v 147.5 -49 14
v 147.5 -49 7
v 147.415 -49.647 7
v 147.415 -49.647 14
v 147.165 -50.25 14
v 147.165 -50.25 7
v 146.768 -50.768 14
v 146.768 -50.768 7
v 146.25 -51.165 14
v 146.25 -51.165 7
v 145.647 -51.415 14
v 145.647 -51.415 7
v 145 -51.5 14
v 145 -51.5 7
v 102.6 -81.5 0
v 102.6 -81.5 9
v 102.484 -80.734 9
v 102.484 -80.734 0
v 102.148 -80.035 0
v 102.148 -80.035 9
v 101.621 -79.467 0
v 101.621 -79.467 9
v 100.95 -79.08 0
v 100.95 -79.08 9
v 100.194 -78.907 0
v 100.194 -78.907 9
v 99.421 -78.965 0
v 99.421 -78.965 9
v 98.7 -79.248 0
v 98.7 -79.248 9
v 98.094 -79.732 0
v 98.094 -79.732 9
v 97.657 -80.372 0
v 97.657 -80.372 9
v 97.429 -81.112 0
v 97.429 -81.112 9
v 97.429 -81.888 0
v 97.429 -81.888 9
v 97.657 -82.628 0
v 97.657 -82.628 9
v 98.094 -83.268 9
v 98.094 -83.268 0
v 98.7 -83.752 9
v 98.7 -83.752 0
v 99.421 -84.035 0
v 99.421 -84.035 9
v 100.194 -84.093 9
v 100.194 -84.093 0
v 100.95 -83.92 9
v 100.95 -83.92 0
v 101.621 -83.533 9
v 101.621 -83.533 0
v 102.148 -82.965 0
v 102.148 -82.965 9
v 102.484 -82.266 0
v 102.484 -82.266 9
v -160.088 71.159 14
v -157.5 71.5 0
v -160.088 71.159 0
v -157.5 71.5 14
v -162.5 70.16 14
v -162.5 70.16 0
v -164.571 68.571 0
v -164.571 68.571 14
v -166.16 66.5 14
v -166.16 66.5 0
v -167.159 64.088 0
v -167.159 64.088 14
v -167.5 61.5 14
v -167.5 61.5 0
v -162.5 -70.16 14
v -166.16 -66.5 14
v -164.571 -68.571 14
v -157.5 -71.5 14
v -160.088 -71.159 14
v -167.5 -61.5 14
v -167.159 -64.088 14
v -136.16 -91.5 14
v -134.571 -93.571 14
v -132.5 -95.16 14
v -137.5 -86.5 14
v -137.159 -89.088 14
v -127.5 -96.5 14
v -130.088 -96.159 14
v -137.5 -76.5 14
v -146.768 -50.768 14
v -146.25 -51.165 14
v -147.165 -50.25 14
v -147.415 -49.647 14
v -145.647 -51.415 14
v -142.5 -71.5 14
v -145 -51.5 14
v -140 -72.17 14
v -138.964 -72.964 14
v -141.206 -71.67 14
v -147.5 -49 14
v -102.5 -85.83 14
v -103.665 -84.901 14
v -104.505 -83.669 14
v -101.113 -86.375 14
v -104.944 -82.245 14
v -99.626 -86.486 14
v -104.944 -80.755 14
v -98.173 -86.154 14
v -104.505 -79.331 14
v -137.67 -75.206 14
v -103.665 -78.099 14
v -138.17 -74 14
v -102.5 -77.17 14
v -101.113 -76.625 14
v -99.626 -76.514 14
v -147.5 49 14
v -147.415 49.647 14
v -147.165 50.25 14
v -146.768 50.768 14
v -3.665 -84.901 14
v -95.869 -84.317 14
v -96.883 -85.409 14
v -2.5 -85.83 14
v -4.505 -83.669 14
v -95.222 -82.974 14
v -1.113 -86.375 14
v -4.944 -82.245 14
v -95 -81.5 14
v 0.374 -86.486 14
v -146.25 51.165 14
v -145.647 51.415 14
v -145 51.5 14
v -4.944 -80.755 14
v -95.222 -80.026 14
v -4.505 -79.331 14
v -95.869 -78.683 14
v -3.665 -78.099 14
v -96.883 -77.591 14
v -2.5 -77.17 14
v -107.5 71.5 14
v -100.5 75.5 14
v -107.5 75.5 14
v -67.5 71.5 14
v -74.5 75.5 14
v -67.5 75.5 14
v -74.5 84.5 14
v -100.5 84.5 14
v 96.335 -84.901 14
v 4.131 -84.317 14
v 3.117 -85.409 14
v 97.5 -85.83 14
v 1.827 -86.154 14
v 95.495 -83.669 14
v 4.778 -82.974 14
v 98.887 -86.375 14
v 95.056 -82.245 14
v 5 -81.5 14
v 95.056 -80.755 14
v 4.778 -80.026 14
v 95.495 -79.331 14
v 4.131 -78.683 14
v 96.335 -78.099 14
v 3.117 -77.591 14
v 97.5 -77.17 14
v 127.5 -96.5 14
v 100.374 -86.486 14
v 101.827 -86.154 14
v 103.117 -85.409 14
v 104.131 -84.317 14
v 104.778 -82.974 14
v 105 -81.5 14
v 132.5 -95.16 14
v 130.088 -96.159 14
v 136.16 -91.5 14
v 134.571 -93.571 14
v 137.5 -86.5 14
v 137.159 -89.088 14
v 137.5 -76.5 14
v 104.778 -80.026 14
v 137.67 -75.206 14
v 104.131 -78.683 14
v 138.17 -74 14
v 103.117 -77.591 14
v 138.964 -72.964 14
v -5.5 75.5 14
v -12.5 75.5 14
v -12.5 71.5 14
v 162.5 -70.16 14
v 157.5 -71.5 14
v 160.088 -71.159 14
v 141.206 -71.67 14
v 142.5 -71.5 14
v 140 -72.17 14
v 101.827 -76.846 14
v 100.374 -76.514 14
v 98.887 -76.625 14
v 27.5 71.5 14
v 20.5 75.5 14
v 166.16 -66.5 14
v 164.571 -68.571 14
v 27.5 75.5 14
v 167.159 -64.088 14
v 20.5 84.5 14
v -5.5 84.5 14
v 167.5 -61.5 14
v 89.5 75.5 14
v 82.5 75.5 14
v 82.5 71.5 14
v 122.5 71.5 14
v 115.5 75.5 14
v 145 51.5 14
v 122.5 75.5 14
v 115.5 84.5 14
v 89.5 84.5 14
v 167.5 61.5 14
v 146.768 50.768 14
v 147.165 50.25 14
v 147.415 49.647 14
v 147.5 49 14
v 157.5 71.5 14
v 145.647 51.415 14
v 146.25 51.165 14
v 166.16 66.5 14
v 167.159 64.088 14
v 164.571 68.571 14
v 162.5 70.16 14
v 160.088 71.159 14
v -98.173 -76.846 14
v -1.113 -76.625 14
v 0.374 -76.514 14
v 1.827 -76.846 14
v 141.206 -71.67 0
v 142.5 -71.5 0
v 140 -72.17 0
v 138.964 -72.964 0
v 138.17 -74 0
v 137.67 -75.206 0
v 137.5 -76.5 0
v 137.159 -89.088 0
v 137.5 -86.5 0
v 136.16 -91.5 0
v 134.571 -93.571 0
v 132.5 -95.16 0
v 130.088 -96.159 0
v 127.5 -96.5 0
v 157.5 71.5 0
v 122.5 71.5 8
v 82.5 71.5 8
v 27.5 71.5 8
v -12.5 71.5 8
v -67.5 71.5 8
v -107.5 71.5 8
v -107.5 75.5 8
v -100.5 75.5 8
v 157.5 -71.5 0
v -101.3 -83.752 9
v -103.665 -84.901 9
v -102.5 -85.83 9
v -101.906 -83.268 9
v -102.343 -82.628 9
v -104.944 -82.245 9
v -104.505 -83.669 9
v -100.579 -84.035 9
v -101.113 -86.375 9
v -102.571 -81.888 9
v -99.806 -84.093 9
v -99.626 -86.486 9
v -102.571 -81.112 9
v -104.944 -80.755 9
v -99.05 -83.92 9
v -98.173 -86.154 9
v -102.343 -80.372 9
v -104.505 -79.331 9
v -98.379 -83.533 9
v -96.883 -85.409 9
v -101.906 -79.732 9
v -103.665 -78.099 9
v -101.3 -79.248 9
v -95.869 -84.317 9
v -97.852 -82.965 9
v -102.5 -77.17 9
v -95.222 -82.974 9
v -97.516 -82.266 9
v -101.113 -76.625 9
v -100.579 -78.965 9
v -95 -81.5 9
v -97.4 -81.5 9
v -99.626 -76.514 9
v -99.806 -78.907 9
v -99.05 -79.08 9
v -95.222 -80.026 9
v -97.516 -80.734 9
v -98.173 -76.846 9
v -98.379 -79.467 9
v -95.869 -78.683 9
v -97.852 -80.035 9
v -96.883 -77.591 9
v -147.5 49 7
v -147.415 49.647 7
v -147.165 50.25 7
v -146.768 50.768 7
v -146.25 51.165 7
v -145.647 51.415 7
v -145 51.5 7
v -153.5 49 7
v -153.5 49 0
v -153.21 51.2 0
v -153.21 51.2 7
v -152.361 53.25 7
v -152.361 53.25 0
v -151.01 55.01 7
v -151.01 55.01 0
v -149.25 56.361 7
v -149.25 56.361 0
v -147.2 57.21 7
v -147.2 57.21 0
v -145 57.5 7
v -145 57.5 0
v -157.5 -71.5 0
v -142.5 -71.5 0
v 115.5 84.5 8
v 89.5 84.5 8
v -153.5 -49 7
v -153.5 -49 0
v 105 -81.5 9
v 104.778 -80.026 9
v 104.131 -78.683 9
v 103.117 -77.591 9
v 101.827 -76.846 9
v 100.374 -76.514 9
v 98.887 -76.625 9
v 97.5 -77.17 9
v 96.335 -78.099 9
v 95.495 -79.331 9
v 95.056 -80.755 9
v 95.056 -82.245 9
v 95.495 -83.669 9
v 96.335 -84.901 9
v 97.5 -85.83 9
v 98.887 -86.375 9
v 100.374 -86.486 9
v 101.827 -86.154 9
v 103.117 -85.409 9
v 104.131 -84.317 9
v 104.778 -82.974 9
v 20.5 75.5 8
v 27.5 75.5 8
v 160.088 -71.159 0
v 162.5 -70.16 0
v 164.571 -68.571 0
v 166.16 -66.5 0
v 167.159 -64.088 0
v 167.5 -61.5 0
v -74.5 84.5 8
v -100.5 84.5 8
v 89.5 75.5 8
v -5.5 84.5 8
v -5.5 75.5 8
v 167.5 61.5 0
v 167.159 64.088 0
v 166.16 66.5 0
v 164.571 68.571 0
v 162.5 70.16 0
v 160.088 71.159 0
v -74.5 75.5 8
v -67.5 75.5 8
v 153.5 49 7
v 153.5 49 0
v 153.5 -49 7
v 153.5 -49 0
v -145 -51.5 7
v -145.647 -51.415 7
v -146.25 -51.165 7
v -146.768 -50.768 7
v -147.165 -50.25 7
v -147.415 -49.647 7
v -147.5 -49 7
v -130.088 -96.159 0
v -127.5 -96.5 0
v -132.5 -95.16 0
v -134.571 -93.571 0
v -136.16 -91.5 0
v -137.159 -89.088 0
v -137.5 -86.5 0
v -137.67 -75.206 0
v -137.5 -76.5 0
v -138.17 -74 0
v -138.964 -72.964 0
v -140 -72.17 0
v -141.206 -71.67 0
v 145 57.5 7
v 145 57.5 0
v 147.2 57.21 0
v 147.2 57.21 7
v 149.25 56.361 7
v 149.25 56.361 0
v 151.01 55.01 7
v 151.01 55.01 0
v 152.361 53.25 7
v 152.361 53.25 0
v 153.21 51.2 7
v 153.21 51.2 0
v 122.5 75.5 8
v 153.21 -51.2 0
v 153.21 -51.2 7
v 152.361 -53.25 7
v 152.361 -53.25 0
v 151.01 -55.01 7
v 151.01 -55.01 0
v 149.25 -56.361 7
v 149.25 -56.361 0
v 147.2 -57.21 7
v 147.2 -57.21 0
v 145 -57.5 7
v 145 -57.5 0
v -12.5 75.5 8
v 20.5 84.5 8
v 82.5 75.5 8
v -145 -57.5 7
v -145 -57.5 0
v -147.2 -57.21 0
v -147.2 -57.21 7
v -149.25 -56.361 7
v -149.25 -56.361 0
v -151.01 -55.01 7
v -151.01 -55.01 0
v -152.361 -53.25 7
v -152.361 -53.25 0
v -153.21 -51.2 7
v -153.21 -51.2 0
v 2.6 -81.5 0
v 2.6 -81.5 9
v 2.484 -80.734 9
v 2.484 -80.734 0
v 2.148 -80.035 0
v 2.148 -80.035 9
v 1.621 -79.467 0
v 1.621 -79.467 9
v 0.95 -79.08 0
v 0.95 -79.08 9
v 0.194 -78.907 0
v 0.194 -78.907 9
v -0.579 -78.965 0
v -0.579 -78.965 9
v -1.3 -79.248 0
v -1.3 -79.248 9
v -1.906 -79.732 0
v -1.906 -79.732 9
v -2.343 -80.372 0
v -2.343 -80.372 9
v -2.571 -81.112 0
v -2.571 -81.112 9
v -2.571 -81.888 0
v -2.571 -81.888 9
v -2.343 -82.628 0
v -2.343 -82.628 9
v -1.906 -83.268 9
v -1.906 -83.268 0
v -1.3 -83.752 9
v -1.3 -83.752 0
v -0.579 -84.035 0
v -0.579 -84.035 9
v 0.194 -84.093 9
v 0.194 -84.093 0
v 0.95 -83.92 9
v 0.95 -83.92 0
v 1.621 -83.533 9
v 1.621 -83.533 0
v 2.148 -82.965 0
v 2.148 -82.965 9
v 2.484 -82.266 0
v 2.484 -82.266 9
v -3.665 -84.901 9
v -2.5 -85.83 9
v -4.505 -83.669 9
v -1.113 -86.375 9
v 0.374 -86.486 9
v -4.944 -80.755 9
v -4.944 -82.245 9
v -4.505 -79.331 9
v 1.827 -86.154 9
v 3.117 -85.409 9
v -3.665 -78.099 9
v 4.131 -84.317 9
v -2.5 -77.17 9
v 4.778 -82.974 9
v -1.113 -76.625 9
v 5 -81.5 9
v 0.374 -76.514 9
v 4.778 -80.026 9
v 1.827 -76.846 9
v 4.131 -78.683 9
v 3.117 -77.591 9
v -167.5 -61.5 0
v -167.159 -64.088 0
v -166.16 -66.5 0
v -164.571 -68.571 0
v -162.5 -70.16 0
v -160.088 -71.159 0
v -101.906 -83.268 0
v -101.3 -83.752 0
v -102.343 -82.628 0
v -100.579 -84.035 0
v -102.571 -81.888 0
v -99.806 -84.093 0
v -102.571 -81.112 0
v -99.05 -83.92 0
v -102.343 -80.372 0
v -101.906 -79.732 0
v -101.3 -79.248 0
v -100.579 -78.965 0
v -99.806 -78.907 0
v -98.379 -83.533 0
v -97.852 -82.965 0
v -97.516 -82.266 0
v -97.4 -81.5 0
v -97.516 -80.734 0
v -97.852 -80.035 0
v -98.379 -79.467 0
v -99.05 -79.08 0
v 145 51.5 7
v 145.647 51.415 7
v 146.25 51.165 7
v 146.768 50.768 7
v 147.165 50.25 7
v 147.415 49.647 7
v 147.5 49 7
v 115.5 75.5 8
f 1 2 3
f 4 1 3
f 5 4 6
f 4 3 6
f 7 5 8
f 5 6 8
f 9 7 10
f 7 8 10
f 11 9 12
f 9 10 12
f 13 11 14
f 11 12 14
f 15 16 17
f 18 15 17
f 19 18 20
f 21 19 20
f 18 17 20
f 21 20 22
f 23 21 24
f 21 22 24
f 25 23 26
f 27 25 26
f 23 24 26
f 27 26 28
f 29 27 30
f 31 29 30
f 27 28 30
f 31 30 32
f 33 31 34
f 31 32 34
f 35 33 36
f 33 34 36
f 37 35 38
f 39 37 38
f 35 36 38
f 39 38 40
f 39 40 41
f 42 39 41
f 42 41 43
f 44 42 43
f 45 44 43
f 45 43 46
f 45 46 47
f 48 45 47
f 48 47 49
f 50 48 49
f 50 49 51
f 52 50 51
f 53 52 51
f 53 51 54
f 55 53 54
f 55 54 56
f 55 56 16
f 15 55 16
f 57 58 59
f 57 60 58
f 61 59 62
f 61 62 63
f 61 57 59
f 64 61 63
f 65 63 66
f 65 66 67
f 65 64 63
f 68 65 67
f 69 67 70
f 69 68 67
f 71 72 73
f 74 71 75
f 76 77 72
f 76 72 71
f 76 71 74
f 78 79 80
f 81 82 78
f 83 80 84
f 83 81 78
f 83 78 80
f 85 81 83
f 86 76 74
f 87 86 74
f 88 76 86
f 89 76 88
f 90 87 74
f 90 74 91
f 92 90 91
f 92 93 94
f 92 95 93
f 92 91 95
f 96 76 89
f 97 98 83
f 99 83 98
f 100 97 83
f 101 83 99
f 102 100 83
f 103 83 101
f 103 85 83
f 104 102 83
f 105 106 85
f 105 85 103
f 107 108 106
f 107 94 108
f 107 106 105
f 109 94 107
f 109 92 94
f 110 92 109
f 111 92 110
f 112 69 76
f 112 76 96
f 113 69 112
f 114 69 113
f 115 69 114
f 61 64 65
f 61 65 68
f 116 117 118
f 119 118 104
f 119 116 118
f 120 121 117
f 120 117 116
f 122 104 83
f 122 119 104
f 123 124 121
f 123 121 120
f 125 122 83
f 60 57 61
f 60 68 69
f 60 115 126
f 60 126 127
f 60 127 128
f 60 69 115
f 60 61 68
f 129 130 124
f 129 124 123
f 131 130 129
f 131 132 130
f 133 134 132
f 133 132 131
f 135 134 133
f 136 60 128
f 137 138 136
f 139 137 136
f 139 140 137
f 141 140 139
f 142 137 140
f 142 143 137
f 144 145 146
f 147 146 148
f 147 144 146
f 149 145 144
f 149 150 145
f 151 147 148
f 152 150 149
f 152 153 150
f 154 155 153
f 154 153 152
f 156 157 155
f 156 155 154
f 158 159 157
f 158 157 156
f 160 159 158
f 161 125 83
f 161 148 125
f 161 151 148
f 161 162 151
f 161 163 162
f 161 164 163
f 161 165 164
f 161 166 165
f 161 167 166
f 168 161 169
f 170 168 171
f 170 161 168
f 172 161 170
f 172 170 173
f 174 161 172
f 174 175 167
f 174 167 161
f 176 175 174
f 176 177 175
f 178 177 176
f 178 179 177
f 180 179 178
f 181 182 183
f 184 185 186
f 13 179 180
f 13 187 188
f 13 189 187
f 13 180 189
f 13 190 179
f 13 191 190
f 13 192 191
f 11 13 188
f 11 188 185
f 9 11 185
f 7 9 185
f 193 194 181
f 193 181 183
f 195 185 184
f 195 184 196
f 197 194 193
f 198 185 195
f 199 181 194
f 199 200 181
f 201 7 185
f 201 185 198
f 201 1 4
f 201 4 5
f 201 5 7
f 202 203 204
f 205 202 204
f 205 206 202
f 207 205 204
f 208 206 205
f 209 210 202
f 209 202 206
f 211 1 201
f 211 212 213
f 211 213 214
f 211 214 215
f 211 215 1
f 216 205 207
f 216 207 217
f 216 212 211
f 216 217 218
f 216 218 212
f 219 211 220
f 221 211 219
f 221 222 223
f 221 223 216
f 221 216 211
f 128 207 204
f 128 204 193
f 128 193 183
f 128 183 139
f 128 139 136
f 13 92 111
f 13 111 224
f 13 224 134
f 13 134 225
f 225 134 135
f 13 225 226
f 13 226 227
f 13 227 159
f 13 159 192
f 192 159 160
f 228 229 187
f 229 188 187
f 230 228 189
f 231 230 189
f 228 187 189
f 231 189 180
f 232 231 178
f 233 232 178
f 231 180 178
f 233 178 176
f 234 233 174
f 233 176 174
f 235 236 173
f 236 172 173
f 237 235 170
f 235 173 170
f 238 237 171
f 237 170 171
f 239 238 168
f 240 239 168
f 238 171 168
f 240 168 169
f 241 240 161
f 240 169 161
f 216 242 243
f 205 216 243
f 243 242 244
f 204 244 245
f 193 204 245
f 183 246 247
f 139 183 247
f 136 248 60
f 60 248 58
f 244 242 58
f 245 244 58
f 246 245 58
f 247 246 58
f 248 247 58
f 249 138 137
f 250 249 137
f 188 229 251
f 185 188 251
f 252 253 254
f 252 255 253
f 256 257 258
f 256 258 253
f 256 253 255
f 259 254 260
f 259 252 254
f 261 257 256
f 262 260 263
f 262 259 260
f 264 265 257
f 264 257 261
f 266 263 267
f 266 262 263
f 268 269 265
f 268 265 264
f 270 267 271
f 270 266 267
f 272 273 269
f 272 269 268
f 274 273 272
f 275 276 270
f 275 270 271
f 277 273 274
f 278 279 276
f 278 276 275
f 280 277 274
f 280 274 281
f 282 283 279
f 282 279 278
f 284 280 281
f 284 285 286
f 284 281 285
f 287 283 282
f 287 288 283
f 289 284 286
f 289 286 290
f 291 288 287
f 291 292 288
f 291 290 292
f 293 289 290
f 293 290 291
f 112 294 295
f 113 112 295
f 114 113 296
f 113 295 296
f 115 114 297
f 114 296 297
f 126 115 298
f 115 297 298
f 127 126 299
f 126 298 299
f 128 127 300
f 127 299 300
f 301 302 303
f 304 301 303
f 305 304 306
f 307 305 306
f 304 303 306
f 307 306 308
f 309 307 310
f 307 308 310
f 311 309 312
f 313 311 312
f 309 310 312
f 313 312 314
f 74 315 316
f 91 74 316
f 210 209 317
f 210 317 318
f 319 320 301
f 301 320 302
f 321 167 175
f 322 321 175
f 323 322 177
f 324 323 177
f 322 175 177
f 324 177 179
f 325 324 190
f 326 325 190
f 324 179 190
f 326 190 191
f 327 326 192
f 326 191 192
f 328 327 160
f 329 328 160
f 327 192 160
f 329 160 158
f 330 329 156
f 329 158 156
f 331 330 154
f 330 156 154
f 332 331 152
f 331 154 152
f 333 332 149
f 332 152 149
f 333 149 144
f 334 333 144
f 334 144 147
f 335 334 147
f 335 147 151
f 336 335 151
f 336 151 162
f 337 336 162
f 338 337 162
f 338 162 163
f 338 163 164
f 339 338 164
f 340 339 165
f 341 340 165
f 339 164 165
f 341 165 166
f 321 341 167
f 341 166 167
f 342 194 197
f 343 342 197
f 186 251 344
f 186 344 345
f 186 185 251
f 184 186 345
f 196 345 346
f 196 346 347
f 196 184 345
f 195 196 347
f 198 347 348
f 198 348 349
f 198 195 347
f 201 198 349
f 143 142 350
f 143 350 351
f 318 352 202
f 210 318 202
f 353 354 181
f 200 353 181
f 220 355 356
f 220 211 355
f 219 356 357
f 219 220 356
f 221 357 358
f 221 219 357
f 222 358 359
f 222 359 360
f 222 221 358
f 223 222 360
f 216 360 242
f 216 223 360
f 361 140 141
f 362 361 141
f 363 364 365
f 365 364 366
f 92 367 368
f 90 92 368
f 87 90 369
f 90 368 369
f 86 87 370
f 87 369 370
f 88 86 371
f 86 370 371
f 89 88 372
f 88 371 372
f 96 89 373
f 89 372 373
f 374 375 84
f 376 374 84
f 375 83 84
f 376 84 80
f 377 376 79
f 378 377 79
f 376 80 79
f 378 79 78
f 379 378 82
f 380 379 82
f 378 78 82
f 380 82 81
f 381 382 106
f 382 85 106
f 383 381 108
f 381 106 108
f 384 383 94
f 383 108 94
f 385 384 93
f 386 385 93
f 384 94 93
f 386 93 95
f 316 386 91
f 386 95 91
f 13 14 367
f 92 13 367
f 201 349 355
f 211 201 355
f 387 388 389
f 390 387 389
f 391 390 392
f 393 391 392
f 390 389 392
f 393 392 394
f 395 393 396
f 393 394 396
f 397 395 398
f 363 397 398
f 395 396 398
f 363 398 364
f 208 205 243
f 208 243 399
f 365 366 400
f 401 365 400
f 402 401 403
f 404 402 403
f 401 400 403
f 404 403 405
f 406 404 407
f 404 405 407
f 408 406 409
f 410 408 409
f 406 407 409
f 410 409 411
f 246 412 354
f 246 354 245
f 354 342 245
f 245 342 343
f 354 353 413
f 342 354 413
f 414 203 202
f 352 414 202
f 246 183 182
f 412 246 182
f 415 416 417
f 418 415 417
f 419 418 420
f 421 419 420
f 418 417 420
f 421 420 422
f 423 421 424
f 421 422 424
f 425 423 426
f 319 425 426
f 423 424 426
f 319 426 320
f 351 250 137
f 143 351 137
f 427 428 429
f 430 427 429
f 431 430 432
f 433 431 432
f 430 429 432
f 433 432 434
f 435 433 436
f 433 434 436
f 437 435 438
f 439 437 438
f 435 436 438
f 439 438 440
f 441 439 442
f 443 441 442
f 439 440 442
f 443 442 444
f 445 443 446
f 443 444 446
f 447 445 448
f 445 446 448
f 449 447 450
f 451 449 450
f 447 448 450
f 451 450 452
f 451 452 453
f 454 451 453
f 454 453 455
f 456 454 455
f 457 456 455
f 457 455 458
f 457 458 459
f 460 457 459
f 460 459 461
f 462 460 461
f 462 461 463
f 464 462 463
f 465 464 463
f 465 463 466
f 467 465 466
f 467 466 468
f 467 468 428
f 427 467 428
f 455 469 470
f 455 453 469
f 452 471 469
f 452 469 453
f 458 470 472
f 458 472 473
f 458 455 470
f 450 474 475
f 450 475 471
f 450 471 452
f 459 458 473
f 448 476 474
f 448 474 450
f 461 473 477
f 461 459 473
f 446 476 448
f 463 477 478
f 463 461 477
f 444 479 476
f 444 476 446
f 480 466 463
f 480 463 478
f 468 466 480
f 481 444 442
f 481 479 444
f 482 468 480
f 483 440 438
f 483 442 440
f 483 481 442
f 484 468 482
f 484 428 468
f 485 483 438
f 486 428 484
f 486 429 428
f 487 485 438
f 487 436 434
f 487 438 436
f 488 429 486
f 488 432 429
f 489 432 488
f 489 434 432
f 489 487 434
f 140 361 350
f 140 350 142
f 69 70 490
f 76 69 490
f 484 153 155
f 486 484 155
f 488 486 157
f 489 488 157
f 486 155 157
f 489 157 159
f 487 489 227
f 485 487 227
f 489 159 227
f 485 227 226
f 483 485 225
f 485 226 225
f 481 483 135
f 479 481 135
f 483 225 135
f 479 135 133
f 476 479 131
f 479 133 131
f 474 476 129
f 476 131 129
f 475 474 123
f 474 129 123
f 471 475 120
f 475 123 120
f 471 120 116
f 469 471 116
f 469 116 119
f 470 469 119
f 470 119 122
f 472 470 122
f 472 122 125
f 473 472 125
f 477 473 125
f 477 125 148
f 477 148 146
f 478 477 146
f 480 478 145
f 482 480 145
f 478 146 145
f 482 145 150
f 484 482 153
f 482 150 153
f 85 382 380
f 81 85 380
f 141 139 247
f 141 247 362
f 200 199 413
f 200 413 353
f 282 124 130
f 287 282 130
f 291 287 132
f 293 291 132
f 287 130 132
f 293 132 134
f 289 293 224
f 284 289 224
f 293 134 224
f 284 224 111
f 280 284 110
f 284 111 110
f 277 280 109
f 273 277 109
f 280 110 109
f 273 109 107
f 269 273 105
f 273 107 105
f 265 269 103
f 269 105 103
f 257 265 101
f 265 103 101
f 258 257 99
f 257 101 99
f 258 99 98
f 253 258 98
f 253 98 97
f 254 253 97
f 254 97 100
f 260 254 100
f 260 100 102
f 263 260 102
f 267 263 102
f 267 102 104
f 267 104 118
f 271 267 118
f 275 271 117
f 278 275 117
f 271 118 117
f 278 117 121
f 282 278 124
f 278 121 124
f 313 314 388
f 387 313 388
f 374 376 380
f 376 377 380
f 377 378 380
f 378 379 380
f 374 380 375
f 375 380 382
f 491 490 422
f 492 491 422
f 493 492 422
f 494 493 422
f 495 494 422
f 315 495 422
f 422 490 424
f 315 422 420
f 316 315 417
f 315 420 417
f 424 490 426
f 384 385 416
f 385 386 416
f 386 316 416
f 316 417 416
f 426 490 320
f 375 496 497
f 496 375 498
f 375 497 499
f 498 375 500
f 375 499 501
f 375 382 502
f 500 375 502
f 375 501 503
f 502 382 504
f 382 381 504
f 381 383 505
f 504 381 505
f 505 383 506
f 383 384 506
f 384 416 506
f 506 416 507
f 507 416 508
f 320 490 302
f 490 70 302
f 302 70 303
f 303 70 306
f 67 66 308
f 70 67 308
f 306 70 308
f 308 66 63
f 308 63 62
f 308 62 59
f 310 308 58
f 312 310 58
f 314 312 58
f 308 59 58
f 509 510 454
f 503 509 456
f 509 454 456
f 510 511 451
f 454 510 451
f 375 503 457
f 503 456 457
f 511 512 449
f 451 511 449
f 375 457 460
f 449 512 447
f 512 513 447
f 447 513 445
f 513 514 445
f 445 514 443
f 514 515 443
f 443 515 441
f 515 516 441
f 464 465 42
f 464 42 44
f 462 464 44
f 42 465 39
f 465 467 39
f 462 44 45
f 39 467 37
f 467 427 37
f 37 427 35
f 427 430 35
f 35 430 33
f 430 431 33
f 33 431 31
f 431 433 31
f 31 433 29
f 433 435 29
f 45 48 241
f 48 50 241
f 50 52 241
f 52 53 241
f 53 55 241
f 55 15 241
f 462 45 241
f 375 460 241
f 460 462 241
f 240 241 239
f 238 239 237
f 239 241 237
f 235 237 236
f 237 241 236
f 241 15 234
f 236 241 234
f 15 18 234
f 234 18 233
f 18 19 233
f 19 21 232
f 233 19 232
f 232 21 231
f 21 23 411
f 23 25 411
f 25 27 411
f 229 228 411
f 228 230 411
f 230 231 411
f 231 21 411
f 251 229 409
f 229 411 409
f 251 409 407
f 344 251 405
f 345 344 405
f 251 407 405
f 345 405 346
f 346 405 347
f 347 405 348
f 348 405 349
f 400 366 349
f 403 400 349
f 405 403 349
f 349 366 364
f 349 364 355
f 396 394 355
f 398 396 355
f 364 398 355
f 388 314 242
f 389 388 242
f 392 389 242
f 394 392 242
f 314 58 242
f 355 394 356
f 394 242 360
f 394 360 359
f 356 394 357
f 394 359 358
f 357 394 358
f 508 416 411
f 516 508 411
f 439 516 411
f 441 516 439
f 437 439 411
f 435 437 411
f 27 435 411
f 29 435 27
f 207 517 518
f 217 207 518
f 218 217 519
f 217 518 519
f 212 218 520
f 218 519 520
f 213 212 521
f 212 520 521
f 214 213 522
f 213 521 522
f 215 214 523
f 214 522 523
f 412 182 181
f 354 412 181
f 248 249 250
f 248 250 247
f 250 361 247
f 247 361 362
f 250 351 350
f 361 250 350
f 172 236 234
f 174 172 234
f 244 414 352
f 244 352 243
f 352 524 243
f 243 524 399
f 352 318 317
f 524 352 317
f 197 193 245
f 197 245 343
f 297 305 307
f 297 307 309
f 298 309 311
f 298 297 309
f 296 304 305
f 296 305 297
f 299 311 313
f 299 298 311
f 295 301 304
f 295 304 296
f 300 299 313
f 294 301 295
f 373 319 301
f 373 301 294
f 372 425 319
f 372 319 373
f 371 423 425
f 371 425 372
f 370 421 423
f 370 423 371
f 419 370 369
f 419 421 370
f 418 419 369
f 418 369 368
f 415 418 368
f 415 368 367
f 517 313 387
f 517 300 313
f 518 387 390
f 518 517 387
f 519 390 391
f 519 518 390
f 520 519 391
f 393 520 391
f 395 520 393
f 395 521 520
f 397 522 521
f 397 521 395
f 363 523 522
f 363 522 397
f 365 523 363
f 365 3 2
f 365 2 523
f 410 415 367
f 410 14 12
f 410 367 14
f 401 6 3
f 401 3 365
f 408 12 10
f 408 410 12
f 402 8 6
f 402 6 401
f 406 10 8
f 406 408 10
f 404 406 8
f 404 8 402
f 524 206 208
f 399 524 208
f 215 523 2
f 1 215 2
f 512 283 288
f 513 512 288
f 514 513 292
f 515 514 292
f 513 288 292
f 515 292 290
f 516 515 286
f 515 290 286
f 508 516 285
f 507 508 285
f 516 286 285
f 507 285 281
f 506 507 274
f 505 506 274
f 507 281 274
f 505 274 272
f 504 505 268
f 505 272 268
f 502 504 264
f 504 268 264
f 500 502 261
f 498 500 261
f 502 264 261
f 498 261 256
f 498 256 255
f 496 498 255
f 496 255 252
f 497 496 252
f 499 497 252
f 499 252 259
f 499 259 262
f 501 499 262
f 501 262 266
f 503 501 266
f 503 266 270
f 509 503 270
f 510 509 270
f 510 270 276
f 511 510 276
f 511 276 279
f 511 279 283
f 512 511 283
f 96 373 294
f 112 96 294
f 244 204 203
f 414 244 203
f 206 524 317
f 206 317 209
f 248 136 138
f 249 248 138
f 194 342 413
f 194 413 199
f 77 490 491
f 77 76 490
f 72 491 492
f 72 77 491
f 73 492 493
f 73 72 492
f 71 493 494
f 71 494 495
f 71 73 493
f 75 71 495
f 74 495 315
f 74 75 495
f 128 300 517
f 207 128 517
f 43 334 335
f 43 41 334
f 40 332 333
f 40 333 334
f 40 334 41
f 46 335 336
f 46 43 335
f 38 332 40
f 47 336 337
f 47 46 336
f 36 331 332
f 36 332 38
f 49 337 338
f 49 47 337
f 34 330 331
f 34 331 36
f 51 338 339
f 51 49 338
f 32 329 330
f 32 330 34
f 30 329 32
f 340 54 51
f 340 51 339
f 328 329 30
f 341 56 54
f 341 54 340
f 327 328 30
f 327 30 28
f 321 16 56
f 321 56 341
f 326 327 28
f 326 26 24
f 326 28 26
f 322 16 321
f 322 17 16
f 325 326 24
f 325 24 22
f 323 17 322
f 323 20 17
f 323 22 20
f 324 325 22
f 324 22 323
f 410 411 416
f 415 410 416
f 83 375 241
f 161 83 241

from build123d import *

# Parameters (mm, degrees)
F1_DEPTH  = 14
F3_DEPTH  = 7
F4_R      = 10
F5_R      = 5
F6_R      = 2.6
F7_DEPTH  = 14.001
F8_R      = 5
F9_DEPTH  = 5
F10_W     = 26
F10_H     = 6
F11_DEPTH = 13
F12_W     = 40
F12_H     = 4
F13_DEPTH = 6


with BuildPart() as f1:
    # F0 (on Top) → F1 (new body)
    with BuildSketch(Plane.XY):
        Polygon((137.5, -71.5), (167.5, -71.5), (167.5, 71.5), (-167.5, 71.5), (-167.5, -71.5), (-137.5, -71.5), (-137.5, -96.5), (137.5, -96.5), align=None)
        with BuildLine():
            ThreePointArc((147.5, -49), (146.767767, -50.767767), (145, -51.5))
            Line((145, -51.5), (-145, -51.5))
            ThreePointArc((-145, -51.5), (-146.767767, -50.767767), (-147.5, -49))
            Line((-147.5, -49), (-147.5, 49))
            ThreePointArc((-147.5, 49), (-146.767767, 50.767767), (-145, 51.5))
            Line((-145, 51.5), (145, 51.5))
            ThreePointArc((145, 51.5), (146.767767, 50.767767), (147.5, 49))
            Line((147.5, 49), (147.5, -49))
        make_face(mode=Mode.SUBTRACT)
    extrude(amount=F1_DEPTH)

    # F2 (on face) → F3 (cut)
    with BuildSketch(Plane(origin=(0, 0, 0), x_dir=(1, 0, 0), z_dir=(0, 0, -1))):
        with BuildLine():
            Line((-145, -57.5), (145, -57.5))
            ThreePointArc((145, -57.5), (151.010408, -55.010408), (153.5, -49))
            Line((153.5, -49), (153.5, 49))
            ThreePointArc((153.5, 49), (151.010408, 55.010408), (145, 57.5))
            Line((145, 57.5), (-145, 57.5))
            ThreePointArc((-145, 57.5), (-151.010408, 55.010408), (-153.5, 49))
            Line((-153.5, 49), (-153.5, -49))
            ThreePointArc((-153.5, -49), (-151.010408, -55.010408), (-145, -57.5))
        make_face()
        with BuildLine():
            Line((147.5, 49), (147.5, -49))
            ThreePointArc((147.5, -49), (146.767767, -50.767767), (145, -51.5))
            Line((145, -51.5), (-145, -51.5))
            ThreePointArc((-145, -51.5), (-146.767767, -50.767767), (-147.5, -49))
            Line((-147.5, -49), (-147.5, 49))
            ThreePointArc((-147.5, 49), (-146.767767, 50.767767), (-145, 51.5))
            Line((-145, 51.5), (145, 51.5))
            ThreePointArc((145, 51.5), (146.767767, 50.767767), (147.5, 49))
        make_face(mode=Mode.SUBTRACT)
    extrude(amount=-F3_DEPTH, mode=Mode.SUBTRACT)

    # F4
    f4_edges = [f1.edges().sort_by_distance(p)[0] for p in [
        (-167.5, -71.5, 7),
        (167.5, -71.5, 7),
        (137.5, -96.5, 7),
        (-137.5, -96.5, 7),
        (167.5, 71.5, 7),
        (-167.5, 71.5, 7),
    ]]
    fillet(f4_edges, radius=F4_R)

    # F5
    f5_edges = [f1.edges().sort_by_distance(p)[0] for p in [
        (137.5, -71.5, 7),
        (-137.5, -71.5, 7),
    ]]
    fillet(f5_edges, radius=F5_R)

    # F6 (on face) → F7 (cut, through all)
    with BuildSketch(Plane.XY.offset(14)):
        with Locations((0, -81.5)):
            Circle(F6_R)
        with Locations((-100, -81.5)):
            Circle(F6_R)
        with Locations((100, -81.5)):
            Circle(F6_R)
    extrude(amount=-F7_DEPTH, mode=Mode.SUBTRACT)

    # F8 (on face) → F9 (cut)
    with BuildSketch(Plane.XY.offset(14)):
        with Locations((-100, -81.5)):
            Circle(F8_R)
        with Locations((0, -81.5)):
            Circle(F8_R)
        with Locations((100, -81.5)):
            Circle(F8_R)
    extrude(amount=-F9_DEPTH, mode=Mode.SUBTRACT)

    # F10 (on face) → F11 (join)
    with BuildSketch(Plane(origin=(0, 71.5, 0), x_dir=(-1, 0, 0), z_dir=(0, 1, 0))):
        with Locations((-102.5, 11)):
            Rectangle(F10_W, F10_H)
        with Locations((-7.5, 11)):
            Rectangle(F10_W, F10_H)
        with Locations((87.5, 11)):
            Rectangle(F10_W, F10_H)
    extrude(amount=F11_DEPTH)

    # F12 (on face) → F13 (join)
    with BuildSketch(Plane.XY.offset(14)):
        with Locations((-87.5, 73.5)):
            Rectangle(F12_W, F12_H)
        with Locations((7.5, 73.5)):
            Rectangle(F12_W, F12_H)
        with Locations((102.5, 73.5)):
            Rectangle(F12_W, F12_H)
    extrude(amount=-F13_DEPTH)


solid = f1.part
